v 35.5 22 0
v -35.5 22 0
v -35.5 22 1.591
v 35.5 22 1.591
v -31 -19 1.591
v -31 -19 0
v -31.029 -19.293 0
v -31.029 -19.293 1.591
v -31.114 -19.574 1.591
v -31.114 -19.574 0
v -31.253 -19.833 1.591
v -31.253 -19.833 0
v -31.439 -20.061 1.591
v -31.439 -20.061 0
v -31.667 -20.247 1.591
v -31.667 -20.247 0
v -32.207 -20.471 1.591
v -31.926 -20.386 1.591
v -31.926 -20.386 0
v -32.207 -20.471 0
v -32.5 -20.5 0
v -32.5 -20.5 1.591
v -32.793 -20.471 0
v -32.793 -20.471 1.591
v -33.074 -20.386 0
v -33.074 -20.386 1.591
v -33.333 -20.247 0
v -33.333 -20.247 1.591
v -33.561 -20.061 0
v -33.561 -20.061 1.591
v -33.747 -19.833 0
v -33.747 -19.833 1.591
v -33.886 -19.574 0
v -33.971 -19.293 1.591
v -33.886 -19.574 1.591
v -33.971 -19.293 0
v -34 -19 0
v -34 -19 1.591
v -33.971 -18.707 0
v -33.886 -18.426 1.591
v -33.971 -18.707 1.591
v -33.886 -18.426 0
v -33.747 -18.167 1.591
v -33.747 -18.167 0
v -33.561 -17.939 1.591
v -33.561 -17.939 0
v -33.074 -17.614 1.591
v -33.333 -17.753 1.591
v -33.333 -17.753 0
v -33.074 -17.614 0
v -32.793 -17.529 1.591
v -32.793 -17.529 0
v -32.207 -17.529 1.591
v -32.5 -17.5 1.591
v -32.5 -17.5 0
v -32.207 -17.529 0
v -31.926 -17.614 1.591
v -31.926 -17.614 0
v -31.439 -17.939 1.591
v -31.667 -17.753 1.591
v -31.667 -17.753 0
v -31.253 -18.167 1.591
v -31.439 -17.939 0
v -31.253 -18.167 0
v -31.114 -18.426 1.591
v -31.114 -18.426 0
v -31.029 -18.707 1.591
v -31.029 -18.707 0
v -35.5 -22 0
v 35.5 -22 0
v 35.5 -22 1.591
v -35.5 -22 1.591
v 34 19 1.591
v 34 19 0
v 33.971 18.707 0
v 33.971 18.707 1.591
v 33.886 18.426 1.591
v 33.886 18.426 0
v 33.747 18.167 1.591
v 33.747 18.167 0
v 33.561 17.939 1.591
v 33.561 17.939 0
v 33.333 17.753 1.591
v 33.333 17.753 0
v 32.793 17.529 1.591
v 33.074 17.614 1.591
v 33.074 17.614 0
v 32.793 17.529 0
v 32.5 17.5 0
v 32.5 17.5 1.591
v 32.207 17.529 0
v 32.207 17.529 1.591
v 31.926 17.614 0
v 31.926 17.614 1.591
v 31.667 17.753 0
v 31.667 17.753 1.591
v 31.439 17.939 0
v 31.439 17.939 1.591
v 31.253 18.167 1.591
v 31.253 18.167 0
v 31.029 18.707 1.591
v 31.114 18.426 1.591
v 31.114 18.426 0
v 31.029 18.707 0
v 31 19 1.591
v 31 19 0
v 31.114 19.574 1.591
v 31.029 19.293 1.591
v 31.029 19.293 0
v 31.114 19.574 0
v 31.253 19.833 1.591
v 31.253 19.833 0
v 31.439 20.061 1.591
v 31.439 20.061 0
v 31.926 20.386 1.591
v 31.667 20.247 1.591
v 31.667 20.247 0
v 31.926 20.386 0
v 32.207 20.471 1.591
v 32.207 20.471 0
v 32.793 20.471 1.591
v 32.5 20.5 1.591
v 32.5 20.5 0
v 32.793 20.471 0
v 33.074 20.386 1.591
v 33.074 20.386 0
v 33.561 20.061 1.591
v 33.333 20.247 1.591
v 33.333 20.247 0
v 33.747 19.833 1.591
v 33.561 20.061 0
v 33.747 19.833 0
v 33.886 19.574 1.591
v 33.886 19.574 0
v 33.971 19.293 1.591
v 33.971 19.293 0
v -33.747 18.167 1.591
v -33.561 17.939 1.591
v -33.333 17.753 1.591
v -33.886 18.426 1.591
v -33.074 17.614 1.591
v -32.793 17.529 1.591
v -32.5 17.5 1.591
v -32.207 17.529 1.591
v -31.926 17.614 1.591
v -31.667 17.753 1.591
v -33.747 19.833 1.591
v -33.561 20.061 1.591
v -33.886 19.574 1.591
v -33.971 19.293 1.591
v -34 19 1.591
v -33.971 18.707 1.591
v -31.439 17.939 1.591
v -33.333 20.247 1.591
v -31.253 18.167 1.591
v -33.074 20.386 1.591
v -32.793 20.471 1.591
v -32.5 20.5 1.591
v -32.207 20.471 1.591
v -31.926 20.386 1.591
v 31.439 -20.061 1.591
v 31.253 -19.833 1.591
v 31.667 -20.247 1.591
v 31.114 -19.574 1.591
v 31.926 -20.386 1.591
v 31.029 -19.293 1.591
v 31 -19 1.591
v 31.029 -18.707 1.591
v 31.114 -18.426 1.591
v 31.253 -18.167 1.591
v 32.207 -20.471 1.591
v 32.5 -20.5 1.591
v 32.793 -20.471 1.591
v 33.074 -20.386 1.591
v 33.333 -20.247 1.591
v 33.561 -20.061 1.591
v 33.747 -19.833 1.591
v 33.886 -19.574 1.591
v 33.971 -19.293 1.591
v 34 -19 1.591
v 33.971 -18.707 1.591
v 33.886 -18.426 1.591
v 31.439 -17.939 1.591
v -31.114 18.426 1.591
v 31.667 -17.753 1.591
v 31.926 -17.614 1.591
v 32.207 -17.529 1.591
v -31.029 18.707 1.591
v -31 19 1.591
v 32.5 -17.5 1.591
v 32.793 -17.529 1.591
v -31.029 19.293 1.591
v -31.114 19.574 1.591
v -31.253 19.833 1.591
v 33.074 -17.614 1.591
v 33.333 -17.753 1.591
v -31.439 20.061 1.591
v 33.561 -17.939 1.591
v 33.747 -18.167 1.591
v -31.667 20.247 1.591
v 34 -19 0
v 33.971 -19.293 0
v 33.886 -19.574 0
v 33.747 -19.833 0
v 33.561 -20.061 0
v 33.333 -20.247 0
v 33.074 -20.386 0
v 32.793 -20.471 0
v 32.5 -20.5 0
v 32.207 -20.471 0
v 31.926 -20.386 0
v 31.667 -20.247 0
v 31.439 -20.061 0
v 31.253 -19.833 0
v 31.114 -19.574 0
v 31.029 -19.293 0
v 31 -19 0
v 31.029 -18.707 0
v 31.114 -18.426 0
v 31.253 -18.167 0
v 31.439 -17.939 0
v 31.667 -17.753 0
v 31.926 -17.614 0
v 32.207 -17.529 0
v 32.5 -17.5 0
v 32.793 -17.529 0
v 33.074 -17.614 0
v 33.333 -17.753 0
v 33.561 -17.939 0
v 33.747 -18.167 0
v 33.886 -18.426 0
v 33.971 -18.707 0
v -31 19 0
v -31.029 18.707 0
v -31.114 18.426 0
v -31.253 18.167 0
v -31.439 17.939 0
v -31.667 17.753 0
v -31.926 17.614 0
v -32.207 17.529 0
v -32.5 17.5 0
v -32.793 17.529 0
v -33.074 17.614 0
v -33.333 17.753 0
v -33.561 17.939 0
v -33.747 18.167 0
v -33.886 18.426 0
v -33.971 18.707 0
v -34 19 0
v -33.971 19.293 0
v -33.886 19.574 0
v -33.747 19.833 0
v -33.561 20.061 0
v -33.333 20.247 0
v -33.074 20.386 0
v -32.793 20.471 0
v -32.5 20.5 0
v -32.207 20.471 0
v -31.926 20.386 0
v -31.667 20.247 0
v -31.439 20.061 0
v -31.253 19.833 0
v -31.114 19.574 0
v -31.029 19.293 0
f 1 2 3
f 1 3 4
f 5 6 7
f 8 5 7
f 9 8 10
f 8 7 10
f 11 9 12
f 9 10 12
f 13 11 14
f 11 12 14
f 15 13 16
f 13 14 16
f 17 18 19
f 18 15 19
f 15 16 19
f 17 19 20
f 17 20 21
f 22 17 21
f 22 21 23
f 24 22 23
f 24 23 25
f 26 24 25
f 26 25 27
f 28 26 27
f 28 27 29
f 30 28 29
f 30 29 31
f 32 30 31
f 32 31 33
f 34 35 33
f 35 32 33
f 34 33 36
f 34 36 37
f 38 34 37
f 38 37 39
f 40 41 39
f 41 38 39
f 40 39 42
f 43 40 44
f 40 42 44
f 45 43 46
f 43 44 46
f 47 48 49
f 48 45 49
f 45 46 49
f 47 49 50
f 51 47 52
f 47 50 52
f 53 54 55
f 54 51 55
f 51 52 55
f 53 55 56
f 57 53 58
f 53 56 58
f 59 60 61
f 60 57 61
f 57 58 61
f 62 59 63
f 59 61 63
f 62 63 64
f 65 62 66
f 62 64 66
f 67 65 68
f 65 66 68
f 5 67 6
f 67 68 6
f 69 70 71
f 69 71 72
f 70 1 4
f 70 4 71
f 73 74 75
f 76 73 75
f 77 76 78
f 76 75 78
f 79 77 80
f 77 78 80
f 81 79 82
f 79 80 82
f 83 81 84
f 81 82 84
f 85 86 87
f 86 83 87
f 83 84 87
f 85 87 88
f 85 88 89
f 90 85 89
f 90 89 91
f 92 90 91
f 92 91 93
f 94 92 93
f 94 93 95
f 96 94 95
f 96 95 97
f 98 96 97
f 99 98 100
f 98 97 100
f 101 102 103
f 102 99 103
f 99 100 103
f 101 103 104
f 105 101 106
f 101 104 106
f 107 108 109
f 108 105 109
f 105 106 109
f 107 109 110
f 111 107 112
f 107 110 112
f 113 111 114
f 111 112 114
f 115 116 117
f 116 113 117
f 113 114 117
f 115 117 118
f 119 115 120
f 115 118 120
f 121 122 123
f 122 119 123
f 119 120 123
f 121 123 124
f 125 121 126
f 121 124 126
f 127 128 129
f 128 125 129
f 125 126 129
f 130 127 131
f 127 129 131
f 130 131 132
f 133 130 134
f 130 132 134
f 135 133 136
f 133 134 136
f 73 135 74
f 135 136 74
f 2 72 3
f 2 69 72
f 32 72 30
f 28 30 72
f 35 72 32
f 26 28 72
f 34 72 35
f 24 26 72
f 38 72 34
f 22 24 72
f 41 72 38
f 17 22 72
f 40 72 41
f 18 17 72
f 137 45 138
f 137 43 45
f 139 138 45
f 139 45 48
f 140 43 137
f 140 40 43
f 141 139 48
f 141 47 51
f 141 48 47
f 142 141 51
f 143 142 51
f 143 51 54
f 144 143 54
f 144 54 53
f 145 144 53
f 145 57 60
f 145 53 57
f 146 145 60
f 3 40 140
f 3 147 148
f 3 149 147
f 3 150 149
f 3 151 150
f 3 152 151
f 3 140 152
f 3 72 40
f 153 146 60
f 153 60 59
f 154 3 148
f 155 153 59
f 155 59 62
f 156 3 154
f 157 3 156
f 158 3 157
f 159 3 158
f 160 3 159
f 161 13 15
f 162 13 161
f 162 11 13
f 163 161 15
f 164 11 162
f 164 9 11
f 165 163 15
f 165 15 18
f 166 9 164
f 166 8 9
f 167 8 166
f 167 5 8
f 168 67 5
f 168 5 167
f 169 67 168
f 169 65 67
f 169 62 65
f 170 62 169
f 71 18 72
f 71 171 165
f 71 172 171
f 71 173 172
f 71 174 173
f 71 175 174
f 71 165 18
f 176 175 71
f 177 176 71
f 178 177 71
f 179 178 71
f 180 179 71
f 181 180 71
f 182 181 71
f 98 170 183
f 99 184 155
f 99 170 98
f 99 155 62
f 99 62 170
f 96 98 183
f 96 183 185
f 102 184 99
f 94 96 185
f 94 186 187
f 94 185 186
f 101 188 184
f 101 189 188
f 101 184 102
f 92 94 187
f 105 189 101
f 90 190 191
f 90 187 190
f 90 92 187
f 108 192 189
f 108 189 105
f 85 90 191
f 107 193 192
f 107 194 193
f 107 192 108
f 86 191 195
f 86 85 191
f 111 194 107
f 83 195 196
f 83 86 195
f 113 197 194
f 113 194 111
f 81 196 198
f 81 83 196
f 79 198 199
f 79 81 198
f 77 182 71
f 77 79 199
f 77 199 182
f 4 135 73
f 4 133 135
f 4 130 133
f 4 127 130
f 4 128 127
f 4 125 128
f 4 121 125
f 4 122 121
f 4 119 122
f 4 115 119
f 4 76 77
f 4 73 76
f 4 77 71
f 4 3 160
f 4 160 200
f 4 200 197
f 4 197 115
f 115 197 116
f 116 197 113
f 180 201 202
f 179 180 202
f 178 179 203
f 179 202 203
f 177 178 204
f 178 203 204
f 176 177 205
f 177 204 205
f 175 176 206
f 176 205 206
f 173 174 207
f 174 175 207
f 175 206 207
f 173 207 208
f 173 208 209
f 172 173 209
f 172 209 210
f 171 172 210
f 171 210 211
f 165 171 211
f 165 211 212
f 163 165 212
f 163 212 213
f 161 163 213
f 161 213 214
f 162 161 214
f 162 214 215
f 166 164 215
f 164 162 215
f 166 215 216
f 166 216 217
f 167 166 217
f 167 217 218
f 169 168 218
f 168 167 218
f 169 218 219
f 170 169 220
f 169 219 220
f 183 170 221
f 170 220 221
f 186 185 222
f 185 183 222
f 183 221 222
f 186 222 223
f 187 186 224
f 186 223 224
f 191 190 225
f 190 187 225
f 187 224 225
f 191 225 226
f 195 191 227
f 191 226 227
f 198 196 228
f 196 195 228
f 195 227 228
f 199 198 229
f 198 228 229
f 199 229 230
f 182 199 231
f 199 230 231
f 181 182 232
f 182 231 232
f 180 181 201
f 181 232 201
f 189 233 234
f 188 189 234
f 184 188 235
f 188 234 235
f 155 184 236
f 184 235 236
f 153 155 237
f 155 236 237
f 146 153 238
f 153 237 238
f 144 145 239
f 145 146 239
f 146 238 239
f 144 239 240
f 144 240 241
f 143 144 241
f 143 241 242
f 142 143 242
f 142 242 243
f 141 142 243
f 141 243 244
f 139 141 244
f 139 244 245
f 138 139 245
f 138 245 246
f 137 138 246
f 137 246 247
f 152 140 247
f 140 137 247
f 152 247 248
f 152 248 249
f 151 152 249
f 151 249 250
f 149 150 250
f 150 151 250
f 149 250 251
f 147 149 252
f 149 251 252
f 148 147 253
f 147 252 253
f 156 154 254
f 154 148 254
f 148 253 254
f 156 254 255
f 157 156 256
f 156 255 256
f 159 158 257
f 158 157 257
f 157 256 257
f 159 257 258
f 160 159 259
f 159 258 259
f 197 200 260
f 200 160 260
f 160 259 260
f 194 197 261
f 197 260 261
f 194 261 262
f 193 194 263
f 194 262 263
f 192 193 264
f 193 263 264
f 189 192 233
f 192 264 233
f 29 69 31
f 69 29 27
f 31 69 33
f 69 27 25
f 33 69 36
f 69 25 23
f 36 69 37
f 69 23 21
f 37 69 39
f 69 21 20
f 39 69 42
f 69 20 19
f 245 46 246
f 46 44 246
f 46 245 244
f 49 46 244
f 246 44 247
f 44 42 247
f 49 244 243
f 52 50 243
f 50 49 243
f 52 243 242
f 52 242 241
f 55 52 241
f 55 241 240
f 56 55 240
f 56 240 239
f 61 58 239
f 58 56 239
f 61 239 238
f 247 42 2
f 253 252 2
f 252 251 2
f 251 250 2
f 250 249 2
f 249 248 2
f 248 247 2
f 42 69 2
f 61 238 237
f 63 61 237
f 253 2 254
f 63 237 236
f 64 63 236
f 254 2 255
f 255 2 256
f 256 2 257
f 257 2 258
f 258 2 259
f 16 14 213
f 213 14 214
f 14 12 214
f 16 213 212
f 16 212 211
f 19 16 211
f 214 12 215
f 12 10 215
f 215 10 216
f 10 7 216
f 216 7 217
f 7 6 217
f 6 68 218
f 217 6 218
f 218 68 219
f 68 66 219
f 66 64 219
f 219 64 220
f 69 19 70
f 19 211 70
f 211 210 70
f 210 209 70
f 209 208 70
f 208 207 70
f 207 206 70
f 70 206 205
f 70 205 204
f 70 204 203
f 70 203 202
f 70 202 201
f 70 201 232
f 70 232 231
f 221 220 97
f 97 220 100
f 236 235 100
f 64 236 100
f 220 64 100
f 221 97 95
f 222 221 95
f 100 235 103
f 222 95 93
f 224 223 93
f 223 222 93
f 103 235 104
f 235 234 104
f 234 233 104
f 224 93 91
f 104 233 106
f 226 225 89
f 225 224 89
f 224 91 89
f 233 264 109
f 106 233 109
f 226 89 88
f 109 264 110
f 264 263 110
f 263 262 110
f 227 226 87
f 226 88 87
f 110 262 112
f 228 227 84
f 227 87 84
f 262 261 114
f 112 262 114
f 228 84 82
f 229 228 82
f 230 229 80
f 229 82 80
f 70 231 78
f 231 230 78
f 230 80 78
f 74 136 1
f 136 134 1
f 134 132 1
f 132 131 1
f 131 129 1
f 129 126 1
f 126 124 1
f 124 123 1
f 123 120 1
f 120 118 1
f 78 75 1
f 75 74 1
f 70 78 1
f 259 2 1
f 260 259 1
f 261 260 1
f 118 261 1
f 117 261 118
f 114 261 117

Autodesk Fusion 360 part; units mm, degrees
sketch "Sketch1" plane through (0, 0, 0) normal (0, 0, 1) x (1, 0, 0)
  line L0 (-35.5, 22) -> (35.5, 22)
  line L1 (35.5, 22) -> (35.5, -22)
  line L2 (35.5, -22) -> (-35.5, -22)
  line L3 (-35.5, -22) -> (-35.5, 22)
  line L4 (0, 0) -> (-35.5, 0) construction
  line L5 (0, 0) -> (0, 22) construction
  circle A0 centre (-32.5, 19) radius 1.5
  circle A1 centre (32.5, 19) radius 1.5
  circle A2 centre (-32.5, -19) radius 1.5
  circle A3 centre (32.5, -19) radius 1.5
  point P0 (-35.5, 0)
  point P1 (0, 22)
  dimension "d1" = 71
  dimension "d2" = 44
  dimension "d3" = 3
  dimension "d4" = 3
  dimension "d5" = 3
  dimension "d8" = 65
  dimension "d9" = -38
extrude "Extrude1" add sketch "Sketch1" along normal blind 1.591
